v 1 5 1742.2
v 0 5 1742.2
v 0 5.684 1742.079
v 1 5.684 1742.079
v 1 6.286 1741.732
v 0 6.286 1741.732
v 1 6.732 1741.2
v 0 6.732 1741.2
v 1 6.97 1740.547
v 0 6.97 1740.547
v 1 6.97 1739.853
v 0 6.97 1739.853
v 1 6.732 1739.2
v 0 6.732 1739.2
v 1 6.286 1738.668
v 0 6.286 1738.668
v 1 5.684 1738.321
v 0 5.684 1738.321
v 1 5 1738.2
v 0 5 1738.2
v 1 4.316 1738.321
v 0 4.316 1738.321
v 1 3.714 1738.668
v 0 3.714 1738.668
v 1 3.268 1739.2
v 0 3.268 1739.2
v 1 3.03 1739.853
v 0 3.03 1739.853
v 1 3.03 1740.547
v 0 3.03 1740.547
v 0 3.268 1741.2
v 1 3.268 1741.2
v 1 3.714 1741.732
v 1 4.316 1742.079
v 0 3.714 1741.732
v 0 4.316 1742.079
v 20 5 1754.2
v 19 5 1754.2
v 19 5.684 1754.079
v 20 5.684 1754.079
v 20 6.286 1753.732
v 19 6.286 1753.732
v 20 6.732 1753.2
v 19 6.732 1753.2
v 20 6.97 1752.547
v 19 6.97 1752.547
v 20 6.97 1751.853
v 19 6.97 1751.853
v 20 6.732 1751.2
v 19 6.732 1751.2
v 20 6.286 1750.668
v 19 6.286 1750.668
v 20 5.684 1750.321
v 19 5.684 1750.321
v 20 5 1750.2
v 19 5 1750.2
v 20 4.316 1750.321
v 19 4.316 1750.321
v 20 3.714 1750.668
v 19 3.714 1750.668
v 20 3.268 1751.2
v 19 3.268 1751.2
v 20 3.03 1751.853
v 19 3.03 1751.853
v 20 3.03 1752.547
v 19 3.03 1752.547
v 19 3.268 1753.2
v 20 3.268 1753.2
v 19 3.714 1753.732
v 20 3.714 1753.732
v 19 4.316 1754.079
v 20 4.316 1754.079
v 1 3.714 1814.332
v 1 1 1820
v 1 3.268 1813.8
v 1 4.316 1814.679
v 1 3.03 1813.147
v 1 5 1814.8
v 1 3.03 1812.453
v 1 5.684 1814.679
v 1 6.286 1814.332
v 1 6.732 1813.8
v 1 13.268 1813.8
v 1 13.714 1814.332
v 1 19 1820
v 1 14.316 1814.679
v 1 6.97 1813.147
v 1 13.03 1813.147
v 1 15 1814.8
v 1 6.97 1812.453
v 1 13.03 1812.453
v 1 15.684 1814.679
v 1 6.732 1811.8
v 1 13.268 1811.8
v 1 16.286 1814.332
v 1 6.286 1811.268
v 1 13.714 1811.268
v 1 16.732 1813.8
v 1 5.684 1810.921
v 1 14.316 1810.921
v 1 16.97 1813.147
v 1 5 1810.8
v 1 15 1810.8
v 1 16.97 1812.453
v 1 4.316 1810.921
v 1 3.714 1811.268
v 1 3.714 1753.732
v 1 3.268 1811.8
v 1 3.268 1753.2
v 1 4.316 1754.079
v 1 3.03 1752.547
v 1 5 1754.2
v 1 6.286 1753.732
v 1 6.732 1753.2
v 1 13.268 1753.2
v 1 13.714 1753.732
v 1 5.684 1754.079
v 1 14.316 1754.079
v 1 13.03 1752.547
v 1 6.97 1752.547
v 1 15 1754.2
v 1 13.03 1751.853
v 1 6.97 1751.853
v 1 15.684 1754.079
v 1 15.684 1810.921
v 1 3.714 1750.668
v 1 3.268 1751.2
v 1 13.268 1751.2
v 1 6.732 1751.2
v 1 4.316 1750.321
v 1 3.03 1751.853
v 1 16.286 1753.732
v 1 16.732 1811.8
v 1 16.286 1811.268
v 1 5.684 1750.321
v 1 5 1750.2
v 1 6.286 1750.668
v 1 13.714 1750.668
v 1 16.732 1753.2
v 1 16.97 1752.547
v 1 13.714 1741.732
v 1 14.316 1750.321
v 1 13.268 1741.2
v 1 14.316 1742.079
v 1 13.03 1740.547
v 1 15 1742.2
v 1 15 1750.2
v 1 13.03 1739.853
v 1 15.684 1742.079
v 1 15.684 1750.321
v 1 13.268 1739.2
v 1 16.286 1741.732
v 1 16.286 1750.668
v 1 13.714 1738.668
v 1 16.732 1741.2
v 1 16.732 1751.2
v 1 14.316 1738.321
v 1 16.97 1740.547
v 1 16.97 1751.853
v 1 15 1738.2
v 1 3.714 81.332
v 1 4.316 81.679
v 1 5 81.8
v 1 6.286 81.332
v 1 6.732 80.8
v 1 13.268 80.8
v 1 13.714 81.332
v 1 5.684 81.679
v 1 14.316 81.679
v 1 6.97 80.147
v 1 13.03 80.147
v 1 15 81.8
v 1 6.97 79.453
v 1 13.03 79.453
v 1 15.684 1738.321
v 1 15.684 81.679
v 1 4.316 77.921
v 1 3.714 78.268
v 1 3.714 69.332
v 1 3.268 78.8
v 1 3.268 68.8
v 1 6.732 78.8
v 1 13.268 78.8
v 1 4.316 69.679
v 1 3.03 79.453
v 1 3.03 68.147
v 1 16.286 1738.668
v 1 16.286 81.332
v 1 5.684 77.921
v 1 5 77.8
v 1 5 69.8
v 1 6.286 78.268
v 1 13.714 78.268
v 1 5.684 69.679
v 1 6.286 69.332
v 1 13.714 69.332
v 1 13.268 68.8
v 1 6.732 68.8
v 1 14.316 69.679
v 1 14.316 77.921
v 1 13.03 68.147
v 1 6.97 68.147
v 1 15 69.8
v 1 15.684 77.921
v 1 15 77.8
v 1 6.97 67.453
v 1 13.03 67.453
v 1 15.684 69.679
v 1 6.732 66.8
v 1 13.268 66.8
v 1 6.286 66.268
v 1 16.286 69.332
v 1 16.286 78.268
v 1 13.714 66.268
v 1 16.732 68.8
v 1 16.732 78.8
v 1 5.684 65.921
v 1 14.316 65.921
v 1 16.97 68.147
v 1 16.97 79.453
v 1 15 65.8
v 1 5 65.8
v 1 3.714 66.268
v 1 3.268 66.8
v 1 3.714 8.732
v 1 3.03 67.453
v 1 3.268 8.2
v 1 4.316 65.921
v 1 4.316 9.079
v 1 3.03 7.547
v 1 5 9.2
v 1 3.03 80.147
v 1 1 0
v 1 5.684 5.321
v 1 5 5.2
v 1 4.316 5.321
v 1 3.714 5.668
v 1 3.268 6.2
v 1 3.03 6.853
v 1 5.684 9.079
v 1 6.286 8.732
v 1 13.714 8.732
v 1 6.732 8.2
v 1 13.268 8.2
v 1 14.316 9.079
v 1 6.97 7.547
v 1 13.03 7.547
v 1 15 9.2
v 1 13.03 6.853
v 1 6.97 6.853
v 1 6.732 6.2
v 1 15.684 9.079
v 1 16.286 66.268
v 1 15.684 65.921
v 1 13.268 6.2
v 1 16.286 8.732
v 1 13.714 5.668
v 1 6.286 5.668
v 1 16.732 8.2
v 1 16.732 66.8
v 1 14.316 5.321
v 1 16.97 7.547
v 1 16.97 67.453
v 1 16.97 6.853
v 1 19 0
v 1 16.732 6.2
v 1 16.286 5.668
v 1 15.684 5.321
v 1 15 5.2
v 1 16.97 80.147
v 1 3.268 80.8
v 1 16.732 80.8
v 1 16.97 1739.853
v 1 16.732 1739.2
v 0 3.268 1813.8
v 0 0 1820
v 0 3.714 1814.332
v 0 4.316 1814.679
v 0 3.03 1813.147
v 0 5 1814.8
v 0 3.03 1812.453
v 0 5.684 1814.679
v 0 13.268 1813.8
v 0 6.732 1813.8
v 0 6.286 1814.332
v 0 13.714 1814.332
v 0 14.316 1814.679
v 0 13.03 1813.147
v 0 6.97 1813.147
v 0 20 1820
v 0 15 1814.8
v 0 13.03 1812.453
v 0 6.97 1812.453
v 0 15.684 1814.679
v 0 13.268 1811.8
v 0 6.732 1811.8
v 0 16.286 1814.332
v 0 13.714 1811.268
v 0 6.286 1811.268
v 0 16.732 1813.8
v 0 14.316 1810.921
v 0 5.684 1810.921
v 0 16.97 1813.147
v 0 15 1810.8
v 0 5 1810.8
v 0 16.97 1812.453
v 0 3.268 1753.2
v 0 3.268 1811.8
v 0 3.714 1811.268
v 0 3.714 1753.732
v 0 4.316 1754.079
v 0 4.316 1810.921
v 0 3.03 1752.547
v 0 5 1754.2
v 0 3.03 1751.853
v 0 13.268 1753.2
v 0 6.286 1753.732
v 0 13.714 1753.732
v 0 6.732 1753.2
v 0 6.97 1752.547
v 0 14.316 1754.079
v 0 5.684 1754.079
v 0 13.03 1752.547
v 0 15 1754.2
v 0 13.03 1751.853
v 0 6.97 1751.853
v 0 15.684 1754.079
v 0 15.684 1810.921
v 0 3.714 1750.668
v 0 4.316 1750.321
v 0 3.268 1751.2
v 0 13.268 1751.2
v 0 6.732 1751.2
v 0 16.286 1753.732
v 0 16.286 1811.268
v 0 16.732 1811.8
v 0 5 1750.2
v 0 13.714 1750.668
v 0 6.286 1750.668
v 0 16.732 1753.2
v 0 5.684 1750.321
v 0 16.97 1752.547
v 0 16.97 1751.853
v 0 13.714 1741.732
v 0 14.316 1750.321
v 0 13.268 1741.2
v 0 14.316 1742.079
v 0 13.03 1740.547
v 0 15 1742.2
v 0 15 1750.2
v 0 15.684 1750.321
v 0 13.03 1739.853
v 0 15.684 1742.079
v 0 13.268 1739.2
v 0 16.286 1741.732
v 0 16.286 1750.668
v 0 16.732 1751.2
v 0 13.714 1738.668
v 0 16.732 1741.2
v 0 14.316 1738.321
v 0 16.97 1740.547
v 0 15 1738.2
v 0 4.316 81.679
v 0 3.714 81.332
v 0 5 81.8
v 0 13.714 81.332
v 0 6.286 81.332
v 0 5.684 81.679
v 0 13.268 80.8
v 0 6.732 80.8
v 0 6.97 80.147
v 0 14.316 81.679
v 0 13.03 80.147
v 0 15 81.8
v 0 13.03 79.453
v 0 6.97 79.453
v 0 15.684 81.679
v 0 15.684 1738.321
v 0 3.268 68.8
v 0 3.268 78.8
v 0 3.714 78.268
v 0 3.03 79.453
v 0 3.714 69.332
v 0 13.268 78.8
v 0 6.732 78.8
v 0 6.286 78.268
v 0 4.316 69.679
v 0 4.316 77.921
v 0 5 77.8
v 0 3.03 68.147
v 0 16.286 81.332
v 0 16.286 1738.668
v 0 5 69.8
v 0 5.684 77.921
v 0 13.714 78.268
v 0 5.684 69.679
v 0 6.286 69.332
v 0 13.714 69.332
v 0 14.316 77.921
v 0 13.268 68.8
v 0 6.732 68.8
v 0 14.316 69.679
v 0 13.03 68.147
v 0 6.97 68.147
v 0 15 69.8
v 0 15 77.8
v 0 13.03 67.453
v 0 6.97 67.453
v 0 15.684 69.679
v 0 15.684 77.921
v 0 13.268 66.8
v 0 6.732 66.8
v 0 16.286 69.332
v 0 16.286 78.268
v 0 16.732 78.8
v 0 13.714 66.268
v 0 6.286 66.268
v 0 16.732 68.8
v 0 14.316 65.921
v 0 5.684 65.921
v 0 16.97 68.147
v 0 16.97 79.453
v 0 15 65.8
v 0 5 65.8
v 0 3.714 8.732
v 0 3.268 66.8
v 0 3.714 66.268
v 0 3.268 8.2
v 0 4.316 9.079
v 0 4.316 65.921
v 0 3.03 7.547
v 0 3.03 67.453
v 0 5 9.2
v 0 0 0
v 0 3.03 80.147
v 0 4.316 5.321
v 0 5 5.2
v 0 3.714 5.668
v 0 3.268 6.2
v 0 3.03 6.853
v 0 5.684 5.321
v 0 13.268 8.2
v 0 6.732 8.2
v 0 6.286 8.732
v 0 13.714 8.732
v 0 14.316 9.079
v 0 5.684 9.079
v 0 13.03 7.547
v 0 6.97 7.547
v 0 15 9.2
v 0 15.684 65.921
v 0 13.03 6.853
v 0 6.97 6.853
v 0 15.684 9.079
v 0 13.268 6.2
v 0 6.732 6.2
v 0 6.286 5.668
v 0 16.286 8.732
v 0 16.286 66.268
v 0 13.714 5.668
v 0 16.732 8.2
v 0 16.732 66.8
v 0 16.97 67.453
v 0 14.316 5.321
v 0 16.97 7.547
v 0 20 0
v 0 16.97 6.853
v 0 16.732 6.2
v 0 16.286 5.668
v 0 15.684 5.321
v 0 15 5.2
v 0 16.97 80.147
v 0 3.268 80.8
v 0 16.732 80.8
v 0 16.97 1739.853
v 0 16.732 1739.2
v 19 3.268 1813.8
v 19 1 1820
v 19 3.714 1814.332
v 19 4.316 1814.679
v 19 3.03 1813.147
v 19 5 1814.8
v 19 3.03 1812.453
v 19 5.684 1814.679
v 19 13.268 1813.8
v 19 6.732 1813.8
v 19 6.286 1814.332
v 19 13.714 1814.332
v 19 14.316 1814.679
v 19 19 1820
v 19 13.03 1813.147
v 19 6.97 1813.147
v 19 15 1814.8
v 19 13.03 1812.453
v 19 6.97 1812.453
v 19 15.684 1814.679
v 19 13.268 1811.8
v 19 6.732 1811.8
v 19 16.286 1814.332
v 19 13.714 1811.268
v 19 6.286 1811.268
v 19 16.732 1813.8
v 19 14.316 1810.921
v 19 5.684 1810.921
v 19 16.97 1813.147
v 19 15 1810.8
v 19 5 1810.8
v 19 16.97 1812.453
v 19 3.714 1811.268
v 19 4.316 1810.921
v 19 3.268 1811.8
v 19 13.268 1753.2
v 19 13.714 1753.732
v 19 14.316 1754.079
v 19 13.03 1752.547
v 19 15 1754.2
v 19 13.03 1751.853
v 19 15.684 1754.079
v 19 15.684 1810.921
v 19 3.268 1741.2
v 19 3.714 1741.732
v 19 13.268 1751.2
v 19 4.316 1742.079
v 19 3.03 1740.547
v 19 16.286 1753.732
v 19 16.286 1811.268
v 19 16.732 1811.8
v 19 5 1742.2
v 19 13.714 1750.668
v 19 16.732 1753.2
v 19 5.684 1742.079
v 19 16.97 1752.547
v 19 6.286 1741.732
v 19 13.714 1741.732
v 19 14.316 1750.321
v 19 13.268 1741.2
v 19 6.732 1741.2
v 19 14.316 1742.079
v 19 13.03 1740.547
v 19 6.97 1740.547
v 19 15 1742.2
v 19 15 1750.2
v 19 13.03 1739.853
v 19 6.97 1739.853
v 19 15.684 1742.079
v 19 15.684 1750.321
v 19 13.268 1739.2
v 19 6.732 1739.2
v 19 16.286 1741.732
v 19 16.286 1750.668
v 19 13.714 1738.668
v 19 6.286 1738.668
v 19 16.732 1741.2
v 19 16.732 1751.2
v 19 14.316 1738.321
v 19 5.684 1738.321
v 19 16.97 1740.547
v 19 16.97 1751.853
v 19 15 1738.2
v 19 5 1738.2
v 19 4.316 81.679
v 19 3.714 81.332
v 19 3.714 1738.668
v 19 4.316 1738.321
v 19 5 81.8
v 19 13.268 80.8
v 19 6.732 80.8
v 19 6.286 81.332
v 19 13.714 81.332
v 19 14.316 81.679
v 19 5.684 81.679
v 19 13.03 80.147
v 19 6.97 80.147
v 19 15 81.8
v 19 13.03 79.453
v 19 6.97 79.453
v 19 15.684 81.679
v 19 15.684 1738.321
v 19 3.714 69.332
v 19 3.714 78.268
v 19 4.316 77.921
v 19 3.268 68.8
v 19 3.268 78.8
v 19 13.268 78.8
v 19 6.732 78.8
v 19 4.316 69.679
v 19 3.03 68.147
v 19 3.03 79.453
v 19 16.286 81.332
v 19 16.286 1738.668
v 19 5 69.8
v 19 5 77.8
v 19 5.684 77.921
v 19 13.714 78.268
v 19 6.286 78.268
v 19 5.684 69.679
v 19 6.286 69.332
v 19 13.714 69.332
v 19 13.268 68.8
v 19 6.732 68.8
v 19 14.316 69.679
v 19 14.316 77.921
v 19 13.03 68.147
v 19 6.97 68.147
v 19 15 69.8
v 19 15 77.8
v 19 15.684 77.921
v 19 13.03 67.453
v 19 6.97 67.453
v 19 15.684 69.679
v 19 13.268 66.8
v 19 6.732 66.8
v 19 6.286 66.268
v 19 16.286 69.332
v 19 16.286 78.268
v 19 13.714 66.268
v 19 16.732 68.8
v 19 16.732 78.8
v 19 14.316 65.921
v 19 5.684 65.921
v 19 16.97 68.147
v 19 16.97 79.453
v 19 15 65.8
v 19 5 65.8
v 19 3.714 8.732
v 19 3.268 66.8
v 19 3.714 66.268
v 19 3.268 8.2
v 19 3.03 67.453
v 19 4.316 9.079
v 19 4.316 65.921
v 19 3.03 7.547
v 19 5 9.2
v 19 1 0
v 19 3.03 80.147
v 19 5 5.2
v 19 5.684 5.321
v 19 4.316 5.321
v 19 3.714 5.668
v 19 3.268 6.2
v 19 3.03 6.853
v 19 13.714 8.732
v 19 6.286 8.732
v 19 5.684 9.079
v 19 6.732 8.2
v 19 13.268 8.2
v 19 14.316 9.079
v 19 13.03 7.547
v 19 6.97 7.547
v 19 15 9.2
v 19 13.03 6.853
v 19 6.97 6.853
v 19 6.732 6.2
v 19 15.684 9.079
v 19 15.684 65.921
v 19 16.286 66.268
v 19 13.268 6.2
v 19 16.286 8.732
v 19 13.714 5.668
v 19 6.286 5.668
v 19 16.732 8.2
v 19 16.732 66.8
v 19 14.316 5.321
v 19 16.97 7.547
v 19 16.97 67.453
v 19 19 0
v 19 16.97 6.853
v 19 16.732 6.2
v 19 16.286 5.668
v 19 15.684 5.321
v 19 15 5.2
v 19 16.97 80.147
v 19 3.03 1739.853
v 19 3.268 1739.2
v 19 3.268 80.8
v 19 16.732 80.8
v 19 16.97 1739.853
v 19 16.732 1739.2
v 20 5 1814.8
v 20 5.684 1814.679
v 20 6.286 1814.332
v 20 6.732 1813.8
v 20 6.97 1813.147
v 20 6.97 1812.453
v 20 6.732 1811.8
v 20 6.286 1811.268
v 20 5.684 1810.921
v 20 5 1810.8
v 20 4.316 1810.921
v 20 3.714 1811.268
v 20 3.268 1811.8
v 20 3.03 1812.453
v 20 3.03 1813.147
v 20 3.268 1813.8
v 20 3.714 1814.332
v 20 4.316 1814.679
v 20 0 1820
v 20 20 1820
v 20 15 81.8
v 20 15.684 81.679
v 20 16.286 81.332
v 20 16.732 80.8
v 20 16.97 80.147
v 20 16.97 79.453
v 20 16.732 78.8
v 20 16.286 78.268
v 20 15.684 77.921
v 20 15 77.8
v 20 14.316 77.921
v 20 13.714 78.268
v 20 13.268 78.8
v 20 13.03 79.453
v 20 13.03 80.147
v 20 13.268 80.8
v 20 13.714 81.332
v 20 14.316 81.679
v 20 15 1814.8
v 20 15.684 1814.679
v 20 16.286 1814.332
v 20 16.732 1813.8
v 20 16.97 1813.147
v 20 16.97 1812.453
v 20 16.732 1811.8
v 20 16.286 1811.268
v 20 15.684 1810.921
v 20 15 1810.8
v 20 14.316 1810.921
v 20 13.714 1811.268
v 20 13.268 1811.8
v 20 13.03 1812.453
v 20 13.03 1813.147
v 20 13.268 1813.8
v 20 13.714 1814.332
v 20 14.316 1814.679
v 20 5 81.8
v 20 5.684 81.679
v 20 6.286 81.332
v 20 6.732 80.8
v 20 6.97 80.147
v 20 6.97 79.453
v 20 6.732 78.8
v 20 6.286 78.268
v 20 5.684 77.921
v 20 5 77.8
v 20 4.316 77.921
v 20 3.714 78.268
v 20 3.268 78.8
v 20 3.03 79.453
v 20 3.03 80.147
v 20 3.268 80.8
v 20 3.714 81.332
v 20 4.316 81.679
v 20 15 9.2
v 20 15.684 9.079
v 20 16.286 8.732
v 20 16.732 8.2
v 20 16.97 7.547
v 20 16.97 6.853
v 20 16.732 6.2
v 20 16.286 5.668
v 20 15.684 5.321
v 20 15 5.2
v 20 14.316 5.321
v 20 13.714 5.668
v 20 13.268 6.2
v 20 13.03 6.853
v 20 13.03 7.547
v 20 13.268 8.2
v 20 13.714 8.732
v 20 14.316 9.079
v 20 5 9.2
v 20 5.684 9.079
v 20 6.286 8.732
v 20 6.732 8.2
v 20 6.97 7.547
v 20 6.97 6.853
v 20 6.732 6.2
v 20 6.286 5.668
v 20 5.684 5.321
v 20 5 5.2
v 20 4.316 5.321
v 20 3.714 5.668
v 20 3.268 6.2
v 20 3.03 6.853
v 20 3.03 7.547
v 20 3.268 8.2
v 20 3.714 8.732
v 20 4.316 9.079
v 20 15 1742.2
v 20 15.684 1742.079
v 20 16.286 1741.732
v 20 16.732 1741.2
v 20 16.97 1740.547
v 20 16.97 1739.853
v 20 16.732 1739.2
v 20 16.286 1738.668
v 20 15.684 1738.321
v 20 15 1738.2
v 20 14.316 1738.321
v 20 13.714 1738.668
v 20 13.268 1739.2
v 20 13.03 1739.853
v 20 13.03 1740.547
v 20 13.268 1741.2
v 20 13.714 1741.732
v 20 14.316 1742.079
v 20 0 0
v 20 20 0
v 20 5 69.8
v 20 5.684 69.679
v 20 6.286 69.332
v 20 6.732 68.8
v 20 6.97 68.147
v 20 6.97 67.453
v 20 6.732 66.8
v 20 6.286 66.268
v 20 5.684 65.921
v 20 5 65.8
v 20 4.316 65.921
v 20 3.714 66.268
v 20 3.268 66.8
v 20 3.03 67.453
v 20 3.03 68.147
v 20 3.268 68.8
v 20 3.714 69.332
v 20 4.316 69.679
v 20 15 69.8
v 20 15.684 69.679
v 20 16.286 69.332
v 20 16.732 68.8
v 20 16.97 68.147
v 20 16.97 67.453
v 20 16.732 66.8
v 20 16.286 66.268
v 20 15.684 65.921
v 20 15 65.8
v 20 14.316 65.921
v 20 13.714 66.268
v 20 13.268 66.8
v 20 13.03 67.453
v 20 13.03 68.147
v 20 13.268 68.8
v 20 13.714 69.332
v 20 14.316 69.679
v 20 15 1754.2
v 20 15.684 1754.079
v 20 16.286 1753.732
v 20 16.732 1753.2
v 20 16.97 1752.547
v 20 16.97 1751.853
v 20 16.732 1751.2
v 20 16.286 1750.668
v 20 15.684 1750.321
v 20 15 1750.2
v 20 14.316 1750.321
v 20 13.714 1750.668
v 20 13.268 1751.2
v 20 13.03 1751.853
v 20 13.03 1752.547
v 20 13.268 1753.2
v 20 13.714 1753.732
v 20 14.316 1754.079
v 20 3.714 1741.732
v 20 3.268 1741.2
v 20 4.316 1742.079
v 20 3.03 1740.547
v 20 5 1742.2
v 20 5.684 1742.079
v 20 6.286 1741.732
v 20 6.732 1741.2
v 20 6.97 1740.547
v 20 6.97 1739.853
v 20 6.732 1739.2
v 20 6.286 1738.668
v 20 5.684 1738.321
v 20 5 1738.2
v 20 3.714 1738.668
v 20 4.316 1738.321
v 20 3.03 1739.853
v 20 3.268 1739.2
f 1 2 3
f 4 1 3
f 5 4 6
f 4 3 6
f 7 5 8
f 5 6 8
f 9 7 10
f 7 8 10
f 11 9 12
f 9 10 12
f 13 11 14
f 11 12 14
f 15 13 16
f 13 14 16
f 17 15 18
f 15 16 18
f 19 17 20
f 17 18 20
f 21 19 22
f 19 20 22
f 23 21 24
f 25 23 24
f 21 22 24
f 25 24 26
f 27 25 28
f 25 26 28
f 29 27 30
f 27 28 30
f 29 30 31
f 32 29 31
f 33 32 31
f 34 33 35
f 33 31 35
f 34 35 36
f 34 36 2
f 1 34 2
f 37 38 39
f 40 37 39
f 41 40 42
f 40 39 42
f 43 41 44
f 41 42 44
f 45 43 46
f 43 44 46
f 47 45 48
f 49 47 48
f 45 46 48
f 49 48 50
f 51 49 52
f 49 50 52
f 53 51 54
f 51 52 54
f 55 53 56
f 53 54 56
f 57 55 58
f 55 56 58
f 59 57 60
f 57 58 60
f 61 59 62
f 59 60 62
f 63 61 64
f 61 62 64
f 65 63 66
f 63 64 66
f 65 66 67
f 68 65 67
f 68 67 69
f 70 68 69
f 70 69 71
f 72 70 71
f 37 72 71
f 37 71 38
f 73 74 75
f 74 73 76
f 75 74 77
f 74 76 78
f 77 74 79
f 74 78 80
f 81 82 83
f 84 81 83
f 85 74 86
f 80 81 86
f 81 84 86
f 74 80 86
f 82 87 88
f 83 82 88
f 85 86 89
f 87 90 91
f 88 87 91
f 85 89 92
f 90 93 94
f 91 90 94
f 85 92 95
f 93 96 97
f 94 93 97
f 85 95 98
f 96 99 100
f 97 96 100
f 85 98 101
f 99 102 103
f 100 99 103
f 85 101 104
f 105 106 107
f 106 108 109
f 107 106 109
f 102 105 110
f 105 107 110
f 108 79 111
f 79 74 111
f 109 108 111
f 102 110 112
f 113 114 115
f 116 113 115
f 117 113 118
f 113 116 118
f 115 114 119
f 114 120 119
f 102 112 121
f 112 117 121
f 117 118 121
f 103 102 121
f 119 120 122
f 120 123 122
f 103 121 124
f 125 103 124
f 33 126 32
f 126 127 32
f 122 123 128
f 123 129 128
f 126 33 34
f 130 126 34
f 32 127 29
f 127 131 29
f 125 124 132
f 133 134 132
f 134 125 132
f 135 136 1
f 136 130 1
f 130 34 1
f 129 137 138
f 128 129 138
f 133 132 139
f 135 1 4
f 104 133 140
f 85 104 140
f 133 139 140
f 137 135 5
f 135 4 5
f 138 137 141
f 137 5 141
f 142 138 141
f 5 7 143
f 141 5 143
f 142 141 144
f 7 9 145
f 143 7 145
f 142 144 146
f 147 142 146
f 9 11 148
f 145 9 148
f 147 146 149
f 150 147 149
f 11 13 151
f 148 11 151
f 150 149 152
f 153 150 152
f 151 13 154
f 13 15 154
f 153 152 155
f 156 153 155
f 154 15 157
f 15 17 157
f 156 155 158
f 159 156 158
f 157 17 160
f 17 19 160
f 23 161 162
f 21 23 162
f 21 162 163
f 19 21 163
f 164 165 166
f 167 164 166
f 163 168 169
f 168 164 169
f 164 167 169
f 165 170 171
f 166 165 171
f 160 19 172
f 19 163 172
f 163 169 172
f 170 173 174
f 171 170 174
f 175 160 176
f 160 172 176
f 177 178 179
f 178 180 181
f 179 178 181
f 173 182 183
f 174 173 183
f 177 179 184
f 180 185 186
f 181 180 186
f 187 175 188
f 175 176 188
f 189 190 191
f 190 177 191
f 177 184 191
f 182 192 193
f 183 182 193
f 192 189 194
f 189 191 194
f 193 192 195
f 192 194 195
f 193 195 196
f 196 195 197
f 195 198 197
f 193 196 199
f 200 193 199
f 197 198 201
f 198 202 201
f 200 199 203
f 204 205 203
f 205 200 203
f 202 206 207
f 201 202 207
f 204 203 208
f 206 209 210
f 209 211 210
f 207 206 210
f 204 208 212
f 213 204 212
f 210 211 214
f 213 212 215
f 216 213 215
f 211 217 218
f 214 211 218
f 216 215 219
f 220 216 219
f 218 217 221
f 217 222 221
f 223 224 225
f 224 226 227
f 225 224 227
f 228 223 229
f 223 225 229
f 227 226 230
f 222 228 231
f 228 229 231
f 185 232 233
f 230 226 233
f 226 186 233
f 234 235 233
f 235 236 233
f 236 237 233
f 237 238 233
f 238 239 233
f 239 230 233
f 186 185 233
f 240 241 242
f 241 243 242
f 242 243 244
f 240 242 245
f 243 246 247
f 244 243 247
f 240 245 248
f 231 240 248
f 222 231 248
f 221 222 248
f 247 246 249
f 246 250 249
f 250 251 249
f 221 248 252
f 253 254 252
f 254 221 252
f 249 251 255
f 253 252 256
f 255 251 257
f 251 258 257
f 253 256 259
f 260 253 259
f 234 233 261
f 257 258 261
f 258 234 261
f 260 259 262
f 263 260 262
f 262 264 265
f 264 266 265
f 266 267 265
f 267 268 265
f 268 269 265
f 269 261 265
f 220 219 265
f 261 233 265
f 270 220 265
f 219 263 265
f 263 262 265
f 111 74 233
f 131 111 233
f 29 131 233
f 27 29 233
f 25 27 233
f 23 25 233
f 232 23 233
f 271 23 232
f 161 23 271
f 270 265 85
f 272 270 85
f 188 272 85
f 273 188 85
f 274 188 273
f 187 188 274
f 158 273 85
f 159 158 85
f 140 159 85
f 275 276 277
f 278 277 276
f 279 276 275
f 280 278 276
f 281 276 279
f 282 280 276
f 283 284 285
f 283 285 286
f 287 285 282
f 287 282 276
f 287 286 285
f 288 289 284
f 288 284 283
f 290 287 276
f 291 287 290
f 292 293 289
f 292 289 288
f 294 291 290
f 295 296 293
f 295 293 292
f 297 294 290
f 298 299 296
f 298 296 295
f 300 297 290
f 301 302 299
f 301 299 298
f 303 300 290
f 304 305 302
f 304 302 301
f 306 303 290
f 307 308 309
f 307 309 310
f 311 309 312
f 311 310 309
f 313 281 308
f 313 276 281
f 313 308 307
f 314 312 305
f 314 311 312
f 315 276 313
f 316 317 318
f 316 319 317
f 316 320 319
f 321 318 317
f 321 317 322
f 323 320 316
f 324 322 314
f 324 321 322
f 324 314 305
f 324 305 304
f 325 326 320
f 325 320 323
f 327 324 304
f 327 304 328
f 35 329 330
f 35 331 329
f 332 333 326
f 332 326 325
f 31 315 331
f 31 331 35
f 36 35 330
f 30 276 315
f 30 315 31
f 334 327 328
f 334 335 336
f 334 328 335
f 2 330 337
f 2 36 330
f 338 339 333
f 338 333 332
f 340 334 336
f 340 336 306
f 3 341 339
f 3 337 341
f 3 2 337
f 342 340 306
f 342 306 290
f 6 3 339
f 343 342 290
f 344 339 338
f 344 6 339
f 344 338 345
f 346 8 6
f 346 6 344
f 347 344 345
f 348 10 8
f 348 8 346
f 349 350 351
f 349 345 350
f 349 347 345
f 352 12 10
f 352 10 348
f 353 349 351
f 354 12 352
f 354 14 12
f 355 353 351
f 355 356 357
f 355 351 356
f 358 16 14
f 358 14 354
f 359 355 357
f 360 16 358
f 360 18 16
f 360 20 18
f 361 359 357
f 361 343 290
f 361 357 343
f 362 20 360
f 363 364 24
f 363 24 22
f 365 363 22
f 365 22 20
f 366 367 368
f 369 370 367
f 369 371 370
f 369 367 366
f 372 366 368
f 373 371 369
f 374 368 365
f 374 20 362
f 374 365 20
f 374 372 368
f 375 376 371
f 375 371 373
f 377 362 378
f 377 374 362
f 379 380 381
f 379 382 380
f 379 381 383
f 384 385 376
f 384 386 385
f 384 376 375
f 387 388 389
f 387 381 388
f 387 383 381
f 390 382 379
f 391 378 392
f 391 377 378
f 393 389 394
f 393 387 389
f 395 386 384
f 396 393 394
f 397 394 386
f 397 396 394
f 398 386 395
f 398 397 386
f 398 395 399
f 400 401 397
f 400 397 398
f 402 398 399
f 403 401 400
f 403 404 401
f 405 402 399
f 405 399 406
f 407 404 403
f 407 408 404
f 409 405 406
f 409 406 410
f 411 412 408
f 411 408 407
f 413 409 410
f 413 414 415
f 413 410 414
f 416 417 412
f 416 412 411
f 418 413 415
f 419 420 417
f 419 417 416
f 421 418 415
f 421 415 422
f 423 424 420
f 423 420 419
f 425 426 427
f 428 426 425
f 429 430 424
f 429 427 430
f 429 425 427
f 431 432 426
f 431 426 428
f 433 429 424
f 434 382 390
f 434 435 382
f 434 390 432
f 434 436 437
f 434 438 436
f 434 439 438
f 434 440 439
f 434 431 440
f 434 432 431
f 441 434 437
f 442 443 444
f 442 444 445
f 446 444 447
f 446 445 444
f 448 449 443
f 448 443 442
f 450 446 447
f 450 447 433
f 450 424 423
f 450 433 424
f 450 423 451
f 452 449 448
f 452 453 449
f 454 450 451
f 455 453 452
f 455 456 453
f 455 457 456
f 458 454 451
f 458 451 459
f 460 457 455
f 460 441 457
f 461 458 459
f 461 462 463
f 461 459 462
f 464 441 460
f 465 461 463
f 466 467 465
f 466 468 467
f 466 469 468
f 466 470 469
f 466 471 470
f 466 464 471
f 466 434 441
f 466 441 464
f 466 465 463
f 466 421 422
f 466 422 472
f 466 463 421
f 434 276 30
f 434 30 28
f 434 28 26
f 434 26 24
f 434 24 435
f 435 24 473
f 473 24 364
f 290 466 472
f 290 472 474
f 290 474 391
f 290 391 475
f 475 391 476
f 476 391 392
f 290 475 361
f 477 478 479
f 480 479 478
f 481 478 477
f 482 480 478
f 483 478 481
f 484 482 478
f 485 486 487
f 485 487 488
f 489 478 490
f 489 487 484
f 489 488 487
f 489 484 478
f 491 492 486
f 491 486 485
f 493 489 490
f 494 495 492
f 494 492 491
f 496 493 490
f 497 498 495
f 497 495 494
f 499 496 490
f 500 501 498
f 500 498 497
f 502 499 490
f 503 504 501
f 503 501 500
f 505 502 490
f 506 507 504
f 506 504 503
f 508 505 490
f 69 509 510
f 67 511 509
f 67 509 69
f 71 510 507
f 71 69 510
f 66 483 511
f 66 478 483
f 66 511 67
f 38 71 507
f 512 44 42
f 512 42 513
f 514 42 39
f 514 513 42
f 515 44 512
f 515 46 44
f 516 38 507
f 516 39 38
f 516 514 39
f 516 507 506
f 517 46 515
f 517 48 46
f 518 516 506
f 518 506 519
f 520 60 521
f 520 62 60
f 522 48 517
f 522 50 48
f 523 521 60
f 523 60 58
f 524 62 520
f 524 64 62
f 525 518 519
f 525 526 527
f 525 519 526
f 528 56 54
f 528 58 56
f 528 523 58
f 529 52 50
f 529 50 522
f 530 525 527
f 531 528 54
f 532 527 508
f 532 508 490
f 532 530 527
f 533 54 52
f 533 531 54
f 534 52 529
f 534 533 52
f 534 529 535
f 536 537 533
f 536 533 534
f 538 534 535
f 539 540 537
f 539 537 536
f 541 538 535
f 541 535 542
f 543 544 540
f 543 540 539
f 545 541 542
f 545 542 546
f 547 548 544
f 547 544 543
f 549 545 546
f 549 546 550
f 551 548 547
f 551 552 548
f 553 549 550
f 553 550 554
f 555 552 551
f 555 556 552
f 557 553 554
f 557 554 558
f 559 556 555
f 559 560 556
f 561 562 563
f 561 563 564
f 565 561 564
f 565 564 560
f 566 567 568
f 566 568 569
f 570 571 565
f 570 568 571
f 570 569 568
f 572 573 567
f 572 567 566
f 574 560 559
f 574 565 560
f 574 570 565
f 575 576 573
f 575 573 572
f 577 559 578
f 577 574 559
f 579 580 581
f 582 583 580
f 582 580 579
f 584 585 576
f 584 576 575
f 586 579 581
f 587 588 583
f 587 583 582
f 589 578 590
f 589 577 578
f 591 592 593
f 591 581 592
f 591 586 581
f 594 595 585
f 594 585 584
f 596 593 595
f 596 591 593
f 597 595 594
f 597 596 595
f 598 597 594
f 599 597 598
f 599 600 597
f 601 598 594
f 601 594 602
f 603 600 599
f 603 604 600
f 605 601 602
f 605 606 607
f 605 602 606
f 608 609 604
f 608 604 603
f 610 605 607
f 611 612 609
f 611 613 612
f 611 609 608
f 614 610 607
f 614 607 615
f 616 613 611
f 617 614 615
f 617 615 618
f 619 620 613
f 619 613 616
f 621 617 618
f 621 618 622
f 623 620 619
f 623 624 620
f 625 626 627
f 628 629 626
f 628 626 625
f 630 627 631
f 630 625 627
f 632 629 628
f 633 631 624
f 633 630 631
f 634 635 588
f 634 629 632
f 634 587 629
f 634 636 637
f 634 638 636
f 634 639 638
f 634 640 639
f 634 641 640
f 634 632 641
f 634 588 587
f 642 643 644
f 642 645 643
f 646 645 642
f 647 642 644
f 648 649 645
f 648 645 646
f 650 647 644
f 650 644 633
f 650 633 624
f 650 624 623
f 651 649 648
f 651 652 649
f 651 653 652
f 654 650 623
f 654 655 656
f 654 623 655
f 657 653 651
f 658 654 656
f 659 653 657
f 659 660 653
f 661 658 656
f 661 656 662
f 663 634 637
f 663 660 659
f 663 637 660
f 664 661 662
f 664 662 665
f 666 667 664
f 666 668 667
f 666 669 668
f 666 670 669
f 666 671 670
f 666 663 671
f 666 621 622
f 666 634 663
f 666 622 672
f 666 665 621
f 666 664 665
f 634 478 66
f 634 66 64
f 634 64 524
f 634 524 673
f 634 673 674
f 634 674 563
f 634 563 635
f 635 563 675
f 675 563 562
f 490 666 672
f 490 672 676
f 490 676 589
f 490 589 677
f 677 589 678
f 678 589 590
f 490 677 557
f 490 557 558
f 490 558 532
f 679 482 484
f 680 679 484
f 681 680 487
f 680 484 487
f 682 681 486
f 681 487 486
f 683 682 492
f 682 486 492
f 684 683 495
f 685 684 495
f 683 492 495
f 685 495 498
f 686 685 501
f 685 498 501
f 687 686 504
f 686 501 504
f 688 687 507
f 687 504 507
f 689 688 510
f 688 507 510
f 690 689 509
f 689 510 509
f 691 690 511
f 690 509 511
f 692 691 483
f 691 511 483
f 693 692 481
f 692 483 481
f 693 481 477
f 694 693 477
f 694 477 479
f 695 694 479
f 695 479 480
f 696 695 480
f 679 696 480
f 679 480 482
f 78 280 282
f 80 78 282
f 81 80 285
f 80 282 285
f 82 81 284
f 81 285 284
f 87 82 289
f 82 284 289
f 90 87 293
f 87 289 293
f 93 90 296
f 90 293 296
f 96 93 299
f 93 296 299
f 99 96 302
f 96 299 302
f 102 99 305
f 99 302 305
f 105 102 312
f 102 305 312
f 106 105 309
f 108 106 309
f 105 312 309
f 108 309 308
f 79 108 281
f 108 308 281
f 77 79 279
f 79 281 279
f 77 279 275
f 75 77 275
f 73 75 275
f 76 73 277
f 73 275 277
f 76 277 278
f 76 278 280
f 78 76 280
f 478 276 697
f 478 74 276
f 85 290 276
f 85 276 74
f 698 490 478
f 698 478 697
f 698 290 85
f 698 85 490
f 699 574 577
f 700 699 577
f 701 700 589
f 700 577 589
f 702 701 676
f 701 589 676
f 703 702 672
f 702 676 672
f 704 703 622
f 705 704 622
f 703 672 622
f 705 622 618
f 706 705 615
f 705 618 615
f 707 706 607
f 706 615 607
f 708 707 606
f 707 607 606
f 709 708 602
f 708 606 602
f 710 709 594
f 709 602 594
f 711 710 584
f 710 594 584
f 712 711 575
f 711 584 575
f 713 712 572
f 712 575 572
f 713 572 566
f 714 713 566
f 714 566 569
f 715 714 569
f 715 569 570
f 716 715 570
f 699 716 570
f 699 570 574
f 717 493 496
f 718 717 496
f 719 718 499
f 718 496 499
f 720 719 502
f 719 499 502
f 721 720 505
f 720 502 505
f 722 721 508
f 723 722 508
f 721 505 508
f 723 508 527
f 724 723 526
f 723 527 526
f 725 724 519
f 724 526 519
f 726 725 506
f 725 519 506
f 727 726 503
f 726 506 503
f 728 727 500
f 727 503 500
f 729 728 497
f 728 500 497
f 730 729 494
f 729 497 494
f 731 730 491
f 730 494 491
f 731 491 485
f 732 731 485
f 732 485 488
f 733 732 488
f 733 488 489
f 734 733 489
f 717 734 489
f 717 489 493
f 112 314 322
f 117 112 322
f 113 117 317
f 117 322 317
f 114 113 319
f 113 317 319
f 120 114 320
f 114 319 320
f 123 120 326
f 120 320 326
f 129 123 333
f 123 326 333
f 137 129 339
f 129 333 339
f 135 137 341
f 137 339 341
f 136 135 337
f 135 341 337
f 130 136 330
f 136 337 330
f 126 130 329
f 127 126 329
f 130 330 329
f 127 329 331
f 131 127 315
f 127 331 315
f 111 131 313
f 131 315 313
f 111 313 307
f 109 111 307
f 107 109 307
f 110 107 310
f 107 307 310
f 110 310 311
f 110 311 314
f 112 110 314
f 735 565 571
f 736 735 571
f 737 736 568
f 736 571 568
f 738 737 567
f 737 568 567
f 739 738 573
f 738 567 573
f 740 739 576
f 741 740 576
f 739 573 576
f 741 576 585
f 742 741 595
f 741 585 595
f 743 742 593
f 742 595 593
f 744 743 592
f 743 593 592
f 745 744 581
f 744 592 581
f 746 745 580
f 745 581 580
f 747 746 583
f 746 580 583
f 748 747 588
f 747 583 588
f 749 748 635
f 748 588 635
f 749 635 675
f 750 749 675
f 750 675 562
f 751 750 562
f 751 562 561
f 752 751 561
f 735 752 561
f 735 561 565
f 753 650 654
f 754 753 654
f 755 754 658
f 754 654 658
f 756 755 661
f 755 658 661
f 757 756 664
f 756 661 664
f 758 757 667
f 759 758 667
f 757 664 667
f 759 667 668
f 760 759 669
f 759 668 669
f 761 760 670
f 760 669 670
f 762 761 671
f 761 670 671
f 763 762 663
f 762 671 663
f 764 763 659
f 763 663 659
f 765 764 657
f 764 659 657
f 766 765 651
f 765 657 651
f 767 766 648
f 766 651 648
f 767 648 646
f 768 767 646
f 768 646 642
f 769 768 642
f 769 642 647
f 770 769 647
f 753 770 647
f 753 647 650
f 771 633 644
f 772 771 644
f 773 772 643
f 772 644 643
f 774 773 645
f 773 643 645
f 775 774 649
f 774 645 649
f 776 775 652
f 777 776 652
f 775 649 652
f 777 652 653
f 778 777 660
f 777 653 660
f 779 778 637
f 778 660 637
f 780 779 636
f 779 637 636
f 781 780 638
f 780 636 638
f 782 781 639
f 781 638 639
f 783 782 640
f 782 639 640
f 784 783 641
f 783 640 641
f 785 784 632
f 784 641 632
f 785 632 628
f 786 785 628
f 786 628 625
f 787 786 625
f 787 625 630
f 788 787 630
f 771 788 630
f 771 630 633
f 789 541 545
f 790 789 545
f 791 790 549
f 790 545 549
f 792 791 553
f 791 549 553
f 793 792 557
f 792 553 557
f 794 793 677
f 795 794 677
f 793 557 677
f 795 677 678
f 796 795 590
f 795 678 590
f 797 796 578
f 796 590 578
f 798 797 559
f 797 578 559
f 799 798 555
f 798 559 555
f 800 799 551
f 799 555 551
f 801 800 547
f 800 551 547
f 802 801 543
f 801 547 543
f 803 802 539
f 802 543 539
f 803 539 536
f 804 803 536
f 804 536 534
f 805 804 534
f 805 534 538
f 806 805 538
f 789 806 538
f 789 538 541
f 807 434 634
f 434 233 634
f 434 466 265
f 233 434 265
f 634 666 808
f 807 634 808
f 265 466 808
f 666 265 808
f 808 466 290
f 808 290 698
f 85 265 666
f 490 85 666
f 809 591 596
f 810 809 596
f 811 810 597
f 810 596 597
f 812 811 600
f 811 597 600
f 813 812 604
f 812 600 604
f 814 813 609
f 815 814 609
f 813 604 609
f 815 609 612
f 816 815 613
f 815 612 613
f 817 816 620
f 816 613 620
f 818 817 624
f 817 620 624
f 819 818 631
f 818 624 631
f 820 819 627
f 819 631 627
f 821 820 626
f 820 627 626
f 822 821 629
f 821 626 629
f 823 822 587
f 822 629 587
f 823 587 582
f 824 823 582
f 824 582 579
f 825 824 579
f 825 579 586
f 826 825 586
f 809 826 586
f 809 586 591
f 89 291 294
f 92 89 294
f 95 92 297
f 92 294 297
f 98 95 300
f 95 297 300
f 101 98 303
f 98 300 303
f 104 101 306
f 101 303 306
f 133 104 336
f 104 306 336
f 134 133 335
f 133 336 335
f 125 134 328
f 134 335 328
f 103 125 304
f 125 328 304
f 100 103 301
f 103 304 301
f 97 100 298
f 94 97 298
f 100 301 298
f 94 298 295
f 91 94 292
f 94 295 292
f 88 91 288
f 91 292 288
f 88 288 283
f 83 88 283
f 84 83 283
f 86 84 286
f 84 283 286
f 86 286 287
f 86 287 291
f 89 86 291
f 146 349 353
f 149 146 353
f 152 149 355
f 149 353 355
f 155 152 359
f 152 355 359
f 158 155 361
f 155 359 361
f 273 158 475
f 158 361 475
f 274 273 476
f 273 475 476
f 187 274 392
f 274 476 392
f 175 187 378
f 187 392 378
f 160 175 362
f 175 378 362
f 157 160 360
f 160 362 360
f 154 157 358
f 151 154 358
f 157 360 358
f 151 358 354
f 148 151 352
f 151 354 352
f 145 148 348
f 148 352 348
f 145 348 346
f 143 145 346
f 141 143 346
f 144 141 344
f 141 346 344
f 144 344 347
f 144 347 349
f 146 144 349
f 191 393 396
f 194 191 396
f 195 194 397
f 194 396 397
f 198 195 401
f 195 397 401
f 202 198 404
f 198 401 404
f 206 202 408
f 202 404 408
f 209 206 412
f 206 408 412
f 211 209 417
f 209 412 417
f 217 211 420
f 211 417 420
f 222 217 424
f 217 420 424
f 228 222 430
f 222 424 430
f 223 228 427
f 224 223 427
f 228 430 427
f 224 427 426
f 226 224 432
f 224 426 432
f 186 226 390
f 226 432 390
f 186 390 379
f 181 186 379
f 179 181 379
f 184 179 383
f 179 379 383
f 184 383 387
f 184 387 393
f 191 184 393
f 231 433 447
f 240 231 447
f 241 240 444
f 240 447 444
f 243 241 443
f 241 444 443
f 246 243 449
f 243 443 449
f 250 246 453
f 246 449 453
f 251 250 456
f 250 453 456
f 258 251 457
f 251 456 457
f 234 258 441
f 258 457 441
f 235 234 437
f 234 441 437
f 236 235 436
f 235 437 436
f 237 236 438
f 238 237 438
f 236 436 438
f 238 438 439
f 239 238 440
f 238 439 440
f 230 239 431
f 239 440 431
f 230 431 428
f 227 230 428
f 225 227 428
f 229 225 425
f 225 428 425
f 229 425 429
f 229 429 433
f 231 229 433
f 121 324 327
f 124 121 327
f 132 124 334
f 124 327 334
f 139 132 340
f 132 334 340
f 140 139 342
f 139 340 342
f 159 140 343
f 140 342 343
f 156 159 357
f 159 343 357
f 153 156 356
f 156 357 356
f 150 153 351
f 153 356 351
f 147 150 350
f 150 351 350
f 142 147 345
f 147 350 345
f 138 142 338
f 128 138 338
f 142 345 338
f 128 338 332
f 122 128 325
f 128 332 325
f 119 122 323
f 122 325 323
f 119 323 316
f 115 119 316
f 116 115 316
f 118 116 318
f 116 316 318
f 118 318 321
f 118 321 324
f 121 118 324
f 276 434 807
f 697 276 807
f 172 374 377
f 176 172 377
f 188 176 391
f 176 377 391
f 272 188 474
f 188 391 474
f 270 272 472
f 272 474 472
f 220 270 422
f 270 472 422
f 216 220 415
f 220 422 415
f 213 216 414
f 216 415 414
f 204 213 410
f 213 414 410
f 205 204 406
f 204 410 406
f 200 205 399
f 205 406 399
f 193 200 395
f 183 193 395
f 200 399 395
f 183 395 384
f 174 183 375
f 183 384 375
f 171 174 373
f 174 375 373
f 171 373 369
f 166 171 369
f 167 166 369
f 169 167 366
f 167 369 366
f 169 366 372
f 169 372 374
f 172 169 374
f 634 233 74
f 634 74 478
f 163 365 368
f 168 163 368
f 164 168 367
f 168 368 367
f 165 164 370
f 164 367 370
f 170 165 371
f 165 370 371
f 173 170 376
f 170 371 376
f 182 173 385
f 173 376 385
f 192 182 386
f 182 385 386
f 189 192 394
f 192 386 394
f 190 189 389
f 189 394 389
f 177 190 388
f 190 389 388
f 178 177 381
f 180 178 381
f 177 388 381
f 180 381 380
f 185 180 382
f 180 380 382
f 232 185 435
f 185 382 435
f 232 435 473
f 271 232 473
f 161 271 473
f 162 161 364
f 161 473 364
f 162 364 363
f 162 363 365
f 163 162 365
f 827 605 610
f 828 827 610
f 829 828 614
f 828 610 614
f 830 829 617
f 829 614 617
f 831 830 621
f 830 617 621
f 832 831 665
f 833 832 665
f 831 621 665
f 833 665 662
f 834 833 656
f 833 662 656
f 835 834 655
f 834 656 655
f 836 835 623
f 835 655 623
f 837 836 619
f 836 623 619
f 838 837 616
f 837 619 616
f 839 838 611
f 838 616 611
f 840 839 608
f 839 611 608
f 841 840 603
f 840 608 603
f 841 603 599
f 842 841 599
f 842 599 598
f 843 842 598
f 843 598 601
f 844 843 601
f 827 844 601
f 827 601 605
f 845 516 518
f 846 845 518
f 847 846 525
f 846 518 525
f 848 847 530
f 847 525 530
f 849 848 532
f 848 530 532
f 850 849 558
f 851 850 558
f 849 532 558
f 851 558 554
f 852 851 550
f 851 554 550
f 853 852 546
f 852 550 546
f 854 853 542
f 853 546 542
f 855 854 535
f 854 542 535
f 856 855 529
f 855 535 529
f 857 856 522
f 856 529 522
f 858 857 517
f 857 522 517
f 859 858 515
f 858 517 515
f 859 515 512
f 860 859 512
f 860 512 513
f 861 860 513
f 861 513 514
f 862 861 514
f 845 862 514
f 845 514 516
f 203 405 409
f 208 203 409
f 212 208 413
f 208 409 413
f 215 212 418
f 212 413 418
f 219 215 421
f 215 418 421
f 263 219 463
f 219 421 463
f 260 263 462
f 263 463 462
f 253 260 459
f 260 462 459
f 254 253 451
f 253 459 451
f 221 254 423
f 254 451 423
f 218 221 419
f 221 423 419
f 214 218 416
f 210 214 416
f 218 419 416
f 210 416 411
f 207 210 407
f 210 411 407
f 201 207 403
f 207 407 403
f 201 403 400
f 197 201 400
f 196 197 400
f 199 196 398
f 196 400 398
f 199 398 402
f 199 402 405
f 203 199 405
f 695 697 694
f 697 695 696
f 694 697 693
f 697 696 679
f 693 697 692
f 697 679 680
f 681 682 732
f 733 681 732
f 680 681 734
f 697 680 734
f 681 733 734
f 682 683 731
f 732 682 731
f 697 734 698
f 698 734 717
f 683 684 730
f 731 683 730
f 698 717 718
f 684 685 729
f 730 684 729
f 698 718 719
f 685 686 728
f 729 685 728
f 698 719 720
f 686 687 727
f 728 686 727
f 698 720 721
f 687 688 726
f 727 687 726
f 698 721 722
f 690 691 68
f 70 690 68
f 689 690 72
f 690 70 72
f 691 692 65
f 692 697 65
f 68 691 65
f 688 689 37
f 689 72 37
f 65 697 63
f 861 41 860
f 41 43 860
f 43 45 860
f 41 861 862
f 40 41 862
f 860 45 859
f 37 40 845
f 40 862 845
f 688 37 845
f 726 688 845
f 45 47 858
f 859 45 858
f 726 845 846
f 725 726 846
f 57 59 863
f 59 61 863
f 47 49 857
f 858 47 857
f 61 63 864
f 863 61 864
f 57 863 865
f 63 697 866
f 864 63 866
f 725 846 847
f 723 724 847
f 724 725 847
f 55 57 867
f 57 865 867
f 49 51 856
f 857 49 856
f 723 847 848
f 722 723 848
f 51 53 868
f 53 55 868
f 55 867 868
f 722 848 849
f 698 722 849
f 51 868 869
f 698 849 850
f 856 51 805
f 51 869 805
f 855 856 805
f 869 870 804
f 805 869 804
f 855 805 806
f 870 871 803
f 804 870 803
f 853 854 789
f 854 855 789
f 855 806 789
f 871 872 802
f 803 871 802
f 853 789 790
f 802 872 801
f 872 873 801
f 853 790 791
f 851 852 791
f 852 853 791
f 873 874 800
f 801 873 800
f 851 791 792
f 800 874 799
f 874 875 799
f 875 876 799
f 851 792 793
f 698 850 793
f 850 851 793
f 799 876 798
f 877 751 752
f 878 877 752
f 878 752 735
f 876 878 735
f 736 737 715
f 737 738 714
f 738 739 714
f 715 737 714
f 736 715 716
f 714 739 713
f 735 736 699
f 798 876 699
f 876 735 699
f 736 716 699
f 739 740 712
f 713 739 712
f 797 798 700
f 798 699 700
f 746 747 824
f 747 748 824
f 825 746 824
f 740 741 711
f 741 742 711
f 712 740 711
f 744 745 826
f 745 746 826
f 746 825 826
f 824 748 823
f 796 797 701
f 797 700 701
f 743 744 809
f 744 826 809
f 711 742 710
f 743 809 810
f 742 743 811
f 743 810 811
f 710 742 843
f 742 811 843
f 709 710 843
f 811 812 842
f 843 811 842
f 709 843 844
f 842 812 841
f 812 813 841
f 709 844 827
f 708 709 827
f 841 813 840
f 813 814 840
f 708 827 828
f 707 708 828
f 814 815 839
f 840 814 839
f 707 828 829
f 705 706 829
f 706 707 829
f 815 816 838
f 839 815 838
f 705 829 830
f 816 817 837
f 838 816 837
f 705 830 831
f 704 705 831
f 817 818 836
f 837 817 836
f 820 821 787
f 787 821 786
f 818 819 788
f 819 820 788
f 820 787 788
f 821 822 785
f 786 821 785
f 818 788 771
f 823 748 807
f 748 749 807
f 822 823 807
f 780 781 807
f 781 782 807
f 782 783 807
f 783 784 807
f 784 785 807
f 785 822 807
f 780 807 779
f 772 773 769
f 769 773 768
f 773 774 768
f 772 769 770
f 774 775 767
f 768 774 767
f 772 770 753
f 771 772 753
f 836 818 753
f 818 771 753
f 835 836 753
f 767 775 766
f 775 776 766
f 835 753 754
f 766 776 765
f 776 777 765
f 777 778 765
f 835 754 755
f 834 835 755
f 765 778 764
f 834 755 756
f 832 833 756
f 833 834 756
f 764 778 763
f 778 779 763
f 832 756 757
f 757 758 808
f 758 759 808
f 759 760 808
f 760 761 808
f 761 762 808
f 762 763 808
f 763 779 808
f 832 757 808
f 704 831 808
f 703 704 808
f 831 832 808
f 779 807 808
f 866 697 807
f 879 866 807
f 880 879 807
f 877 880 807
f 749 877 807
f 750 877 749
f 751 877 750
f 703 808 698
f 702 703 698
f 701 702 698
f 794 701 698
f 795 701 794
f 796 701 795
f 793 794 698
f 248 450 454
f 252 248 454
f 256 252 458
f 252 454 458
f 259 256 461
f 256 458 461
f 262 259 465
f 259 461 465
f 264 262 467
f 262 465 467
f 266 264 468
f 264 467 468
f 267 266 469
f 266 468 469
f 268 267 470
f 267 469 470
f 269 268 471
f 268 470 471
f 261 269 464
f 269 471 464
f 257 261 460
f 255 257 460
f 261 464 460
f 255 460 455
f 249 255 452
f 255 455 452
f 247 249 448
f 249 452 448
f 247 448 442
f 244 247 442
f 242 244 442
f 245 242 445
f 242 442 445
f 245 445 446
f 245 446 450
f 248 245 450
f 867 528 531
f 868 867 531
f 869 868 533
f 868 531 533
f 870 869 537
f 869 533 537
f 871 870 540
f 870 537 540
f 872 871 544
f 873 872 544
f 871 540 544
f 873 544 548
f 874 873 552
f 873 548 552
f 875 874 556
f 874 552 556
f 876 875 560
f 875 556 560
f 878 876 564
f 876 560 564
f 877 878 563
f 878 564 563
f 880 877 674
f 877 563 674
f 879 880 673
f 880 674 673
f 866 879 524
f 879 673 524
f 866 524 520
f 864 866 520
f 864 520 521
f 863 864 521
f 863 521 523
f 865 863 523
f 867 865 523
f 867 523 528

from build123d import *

# Parameters (mm, degrees)
SKETCH_1_W          = 20
SKETCH_1_H          = 20
SKETCH_1_W_2        = 18
SKETCH_1_H_2        = 18
EXTRUDE_1_DEPTH     = 1820
SKETCH_2_R          = 2
CUT_EXTRUDE_1_DEPTH = 1821.219766951


with BuildPart() as part:
    # 草图1 → 凸台-拉伸1 (new body)
    with BuildSketch(Plane.XY):
        with Locations((10, 10)):
            Rectangle(SKETCH_1_W, SKETCH_1_H)
        with Locations((10, 10)):
            Rectangle(SKETCH_1_W_2, SKETCH_1_H_2, mode=Mode.SUBTRACT)
    extrude(amount=EXTRUDE_1_DEPTH)

    # 草图2 → 切除-拉伸1 (cut, through all)
    with BuildSketch(Plane.ZY):
        with Locations((1812.8, 5)):
            Circle(SKETCH_2_R)
        with Locations((1812.8, 15)):
            Circle(SKETCH_2_R)
        with Locations((1752.2, 15)):
            Circle(SKETCH_2_R)
        with Locations((1740.2, 15)):
            Circle(SKETCH_2_R)
        with Locations((1740.2, 5)):
            Circle(SKETCH_2_R)
        with Locations((1752.2, 5)):
            Circle(SKETCH_2_R)
        with Locations((7.2, 5)):
            Circle(SKETCH_2_R)
        with Locations((7.2, 15)):
            Circle(SKETCH_2_R)
        with Locations((67.8, 15)):
            Circle(SKETCH_2_R)
        with Locations((79.8, 15)):
            Circle(SKETCH_2_R)
        with Locations((79.8, 5)):
            Circle(SKETCH_2_R)
        with Locations((67.8, 5)):
            Circle(SKETCH_2_R)
    extrude(amount=-CUT_EXTRUDE_1_DEPTH, mode=Mode.SUBTRACT)


solid = part.part
